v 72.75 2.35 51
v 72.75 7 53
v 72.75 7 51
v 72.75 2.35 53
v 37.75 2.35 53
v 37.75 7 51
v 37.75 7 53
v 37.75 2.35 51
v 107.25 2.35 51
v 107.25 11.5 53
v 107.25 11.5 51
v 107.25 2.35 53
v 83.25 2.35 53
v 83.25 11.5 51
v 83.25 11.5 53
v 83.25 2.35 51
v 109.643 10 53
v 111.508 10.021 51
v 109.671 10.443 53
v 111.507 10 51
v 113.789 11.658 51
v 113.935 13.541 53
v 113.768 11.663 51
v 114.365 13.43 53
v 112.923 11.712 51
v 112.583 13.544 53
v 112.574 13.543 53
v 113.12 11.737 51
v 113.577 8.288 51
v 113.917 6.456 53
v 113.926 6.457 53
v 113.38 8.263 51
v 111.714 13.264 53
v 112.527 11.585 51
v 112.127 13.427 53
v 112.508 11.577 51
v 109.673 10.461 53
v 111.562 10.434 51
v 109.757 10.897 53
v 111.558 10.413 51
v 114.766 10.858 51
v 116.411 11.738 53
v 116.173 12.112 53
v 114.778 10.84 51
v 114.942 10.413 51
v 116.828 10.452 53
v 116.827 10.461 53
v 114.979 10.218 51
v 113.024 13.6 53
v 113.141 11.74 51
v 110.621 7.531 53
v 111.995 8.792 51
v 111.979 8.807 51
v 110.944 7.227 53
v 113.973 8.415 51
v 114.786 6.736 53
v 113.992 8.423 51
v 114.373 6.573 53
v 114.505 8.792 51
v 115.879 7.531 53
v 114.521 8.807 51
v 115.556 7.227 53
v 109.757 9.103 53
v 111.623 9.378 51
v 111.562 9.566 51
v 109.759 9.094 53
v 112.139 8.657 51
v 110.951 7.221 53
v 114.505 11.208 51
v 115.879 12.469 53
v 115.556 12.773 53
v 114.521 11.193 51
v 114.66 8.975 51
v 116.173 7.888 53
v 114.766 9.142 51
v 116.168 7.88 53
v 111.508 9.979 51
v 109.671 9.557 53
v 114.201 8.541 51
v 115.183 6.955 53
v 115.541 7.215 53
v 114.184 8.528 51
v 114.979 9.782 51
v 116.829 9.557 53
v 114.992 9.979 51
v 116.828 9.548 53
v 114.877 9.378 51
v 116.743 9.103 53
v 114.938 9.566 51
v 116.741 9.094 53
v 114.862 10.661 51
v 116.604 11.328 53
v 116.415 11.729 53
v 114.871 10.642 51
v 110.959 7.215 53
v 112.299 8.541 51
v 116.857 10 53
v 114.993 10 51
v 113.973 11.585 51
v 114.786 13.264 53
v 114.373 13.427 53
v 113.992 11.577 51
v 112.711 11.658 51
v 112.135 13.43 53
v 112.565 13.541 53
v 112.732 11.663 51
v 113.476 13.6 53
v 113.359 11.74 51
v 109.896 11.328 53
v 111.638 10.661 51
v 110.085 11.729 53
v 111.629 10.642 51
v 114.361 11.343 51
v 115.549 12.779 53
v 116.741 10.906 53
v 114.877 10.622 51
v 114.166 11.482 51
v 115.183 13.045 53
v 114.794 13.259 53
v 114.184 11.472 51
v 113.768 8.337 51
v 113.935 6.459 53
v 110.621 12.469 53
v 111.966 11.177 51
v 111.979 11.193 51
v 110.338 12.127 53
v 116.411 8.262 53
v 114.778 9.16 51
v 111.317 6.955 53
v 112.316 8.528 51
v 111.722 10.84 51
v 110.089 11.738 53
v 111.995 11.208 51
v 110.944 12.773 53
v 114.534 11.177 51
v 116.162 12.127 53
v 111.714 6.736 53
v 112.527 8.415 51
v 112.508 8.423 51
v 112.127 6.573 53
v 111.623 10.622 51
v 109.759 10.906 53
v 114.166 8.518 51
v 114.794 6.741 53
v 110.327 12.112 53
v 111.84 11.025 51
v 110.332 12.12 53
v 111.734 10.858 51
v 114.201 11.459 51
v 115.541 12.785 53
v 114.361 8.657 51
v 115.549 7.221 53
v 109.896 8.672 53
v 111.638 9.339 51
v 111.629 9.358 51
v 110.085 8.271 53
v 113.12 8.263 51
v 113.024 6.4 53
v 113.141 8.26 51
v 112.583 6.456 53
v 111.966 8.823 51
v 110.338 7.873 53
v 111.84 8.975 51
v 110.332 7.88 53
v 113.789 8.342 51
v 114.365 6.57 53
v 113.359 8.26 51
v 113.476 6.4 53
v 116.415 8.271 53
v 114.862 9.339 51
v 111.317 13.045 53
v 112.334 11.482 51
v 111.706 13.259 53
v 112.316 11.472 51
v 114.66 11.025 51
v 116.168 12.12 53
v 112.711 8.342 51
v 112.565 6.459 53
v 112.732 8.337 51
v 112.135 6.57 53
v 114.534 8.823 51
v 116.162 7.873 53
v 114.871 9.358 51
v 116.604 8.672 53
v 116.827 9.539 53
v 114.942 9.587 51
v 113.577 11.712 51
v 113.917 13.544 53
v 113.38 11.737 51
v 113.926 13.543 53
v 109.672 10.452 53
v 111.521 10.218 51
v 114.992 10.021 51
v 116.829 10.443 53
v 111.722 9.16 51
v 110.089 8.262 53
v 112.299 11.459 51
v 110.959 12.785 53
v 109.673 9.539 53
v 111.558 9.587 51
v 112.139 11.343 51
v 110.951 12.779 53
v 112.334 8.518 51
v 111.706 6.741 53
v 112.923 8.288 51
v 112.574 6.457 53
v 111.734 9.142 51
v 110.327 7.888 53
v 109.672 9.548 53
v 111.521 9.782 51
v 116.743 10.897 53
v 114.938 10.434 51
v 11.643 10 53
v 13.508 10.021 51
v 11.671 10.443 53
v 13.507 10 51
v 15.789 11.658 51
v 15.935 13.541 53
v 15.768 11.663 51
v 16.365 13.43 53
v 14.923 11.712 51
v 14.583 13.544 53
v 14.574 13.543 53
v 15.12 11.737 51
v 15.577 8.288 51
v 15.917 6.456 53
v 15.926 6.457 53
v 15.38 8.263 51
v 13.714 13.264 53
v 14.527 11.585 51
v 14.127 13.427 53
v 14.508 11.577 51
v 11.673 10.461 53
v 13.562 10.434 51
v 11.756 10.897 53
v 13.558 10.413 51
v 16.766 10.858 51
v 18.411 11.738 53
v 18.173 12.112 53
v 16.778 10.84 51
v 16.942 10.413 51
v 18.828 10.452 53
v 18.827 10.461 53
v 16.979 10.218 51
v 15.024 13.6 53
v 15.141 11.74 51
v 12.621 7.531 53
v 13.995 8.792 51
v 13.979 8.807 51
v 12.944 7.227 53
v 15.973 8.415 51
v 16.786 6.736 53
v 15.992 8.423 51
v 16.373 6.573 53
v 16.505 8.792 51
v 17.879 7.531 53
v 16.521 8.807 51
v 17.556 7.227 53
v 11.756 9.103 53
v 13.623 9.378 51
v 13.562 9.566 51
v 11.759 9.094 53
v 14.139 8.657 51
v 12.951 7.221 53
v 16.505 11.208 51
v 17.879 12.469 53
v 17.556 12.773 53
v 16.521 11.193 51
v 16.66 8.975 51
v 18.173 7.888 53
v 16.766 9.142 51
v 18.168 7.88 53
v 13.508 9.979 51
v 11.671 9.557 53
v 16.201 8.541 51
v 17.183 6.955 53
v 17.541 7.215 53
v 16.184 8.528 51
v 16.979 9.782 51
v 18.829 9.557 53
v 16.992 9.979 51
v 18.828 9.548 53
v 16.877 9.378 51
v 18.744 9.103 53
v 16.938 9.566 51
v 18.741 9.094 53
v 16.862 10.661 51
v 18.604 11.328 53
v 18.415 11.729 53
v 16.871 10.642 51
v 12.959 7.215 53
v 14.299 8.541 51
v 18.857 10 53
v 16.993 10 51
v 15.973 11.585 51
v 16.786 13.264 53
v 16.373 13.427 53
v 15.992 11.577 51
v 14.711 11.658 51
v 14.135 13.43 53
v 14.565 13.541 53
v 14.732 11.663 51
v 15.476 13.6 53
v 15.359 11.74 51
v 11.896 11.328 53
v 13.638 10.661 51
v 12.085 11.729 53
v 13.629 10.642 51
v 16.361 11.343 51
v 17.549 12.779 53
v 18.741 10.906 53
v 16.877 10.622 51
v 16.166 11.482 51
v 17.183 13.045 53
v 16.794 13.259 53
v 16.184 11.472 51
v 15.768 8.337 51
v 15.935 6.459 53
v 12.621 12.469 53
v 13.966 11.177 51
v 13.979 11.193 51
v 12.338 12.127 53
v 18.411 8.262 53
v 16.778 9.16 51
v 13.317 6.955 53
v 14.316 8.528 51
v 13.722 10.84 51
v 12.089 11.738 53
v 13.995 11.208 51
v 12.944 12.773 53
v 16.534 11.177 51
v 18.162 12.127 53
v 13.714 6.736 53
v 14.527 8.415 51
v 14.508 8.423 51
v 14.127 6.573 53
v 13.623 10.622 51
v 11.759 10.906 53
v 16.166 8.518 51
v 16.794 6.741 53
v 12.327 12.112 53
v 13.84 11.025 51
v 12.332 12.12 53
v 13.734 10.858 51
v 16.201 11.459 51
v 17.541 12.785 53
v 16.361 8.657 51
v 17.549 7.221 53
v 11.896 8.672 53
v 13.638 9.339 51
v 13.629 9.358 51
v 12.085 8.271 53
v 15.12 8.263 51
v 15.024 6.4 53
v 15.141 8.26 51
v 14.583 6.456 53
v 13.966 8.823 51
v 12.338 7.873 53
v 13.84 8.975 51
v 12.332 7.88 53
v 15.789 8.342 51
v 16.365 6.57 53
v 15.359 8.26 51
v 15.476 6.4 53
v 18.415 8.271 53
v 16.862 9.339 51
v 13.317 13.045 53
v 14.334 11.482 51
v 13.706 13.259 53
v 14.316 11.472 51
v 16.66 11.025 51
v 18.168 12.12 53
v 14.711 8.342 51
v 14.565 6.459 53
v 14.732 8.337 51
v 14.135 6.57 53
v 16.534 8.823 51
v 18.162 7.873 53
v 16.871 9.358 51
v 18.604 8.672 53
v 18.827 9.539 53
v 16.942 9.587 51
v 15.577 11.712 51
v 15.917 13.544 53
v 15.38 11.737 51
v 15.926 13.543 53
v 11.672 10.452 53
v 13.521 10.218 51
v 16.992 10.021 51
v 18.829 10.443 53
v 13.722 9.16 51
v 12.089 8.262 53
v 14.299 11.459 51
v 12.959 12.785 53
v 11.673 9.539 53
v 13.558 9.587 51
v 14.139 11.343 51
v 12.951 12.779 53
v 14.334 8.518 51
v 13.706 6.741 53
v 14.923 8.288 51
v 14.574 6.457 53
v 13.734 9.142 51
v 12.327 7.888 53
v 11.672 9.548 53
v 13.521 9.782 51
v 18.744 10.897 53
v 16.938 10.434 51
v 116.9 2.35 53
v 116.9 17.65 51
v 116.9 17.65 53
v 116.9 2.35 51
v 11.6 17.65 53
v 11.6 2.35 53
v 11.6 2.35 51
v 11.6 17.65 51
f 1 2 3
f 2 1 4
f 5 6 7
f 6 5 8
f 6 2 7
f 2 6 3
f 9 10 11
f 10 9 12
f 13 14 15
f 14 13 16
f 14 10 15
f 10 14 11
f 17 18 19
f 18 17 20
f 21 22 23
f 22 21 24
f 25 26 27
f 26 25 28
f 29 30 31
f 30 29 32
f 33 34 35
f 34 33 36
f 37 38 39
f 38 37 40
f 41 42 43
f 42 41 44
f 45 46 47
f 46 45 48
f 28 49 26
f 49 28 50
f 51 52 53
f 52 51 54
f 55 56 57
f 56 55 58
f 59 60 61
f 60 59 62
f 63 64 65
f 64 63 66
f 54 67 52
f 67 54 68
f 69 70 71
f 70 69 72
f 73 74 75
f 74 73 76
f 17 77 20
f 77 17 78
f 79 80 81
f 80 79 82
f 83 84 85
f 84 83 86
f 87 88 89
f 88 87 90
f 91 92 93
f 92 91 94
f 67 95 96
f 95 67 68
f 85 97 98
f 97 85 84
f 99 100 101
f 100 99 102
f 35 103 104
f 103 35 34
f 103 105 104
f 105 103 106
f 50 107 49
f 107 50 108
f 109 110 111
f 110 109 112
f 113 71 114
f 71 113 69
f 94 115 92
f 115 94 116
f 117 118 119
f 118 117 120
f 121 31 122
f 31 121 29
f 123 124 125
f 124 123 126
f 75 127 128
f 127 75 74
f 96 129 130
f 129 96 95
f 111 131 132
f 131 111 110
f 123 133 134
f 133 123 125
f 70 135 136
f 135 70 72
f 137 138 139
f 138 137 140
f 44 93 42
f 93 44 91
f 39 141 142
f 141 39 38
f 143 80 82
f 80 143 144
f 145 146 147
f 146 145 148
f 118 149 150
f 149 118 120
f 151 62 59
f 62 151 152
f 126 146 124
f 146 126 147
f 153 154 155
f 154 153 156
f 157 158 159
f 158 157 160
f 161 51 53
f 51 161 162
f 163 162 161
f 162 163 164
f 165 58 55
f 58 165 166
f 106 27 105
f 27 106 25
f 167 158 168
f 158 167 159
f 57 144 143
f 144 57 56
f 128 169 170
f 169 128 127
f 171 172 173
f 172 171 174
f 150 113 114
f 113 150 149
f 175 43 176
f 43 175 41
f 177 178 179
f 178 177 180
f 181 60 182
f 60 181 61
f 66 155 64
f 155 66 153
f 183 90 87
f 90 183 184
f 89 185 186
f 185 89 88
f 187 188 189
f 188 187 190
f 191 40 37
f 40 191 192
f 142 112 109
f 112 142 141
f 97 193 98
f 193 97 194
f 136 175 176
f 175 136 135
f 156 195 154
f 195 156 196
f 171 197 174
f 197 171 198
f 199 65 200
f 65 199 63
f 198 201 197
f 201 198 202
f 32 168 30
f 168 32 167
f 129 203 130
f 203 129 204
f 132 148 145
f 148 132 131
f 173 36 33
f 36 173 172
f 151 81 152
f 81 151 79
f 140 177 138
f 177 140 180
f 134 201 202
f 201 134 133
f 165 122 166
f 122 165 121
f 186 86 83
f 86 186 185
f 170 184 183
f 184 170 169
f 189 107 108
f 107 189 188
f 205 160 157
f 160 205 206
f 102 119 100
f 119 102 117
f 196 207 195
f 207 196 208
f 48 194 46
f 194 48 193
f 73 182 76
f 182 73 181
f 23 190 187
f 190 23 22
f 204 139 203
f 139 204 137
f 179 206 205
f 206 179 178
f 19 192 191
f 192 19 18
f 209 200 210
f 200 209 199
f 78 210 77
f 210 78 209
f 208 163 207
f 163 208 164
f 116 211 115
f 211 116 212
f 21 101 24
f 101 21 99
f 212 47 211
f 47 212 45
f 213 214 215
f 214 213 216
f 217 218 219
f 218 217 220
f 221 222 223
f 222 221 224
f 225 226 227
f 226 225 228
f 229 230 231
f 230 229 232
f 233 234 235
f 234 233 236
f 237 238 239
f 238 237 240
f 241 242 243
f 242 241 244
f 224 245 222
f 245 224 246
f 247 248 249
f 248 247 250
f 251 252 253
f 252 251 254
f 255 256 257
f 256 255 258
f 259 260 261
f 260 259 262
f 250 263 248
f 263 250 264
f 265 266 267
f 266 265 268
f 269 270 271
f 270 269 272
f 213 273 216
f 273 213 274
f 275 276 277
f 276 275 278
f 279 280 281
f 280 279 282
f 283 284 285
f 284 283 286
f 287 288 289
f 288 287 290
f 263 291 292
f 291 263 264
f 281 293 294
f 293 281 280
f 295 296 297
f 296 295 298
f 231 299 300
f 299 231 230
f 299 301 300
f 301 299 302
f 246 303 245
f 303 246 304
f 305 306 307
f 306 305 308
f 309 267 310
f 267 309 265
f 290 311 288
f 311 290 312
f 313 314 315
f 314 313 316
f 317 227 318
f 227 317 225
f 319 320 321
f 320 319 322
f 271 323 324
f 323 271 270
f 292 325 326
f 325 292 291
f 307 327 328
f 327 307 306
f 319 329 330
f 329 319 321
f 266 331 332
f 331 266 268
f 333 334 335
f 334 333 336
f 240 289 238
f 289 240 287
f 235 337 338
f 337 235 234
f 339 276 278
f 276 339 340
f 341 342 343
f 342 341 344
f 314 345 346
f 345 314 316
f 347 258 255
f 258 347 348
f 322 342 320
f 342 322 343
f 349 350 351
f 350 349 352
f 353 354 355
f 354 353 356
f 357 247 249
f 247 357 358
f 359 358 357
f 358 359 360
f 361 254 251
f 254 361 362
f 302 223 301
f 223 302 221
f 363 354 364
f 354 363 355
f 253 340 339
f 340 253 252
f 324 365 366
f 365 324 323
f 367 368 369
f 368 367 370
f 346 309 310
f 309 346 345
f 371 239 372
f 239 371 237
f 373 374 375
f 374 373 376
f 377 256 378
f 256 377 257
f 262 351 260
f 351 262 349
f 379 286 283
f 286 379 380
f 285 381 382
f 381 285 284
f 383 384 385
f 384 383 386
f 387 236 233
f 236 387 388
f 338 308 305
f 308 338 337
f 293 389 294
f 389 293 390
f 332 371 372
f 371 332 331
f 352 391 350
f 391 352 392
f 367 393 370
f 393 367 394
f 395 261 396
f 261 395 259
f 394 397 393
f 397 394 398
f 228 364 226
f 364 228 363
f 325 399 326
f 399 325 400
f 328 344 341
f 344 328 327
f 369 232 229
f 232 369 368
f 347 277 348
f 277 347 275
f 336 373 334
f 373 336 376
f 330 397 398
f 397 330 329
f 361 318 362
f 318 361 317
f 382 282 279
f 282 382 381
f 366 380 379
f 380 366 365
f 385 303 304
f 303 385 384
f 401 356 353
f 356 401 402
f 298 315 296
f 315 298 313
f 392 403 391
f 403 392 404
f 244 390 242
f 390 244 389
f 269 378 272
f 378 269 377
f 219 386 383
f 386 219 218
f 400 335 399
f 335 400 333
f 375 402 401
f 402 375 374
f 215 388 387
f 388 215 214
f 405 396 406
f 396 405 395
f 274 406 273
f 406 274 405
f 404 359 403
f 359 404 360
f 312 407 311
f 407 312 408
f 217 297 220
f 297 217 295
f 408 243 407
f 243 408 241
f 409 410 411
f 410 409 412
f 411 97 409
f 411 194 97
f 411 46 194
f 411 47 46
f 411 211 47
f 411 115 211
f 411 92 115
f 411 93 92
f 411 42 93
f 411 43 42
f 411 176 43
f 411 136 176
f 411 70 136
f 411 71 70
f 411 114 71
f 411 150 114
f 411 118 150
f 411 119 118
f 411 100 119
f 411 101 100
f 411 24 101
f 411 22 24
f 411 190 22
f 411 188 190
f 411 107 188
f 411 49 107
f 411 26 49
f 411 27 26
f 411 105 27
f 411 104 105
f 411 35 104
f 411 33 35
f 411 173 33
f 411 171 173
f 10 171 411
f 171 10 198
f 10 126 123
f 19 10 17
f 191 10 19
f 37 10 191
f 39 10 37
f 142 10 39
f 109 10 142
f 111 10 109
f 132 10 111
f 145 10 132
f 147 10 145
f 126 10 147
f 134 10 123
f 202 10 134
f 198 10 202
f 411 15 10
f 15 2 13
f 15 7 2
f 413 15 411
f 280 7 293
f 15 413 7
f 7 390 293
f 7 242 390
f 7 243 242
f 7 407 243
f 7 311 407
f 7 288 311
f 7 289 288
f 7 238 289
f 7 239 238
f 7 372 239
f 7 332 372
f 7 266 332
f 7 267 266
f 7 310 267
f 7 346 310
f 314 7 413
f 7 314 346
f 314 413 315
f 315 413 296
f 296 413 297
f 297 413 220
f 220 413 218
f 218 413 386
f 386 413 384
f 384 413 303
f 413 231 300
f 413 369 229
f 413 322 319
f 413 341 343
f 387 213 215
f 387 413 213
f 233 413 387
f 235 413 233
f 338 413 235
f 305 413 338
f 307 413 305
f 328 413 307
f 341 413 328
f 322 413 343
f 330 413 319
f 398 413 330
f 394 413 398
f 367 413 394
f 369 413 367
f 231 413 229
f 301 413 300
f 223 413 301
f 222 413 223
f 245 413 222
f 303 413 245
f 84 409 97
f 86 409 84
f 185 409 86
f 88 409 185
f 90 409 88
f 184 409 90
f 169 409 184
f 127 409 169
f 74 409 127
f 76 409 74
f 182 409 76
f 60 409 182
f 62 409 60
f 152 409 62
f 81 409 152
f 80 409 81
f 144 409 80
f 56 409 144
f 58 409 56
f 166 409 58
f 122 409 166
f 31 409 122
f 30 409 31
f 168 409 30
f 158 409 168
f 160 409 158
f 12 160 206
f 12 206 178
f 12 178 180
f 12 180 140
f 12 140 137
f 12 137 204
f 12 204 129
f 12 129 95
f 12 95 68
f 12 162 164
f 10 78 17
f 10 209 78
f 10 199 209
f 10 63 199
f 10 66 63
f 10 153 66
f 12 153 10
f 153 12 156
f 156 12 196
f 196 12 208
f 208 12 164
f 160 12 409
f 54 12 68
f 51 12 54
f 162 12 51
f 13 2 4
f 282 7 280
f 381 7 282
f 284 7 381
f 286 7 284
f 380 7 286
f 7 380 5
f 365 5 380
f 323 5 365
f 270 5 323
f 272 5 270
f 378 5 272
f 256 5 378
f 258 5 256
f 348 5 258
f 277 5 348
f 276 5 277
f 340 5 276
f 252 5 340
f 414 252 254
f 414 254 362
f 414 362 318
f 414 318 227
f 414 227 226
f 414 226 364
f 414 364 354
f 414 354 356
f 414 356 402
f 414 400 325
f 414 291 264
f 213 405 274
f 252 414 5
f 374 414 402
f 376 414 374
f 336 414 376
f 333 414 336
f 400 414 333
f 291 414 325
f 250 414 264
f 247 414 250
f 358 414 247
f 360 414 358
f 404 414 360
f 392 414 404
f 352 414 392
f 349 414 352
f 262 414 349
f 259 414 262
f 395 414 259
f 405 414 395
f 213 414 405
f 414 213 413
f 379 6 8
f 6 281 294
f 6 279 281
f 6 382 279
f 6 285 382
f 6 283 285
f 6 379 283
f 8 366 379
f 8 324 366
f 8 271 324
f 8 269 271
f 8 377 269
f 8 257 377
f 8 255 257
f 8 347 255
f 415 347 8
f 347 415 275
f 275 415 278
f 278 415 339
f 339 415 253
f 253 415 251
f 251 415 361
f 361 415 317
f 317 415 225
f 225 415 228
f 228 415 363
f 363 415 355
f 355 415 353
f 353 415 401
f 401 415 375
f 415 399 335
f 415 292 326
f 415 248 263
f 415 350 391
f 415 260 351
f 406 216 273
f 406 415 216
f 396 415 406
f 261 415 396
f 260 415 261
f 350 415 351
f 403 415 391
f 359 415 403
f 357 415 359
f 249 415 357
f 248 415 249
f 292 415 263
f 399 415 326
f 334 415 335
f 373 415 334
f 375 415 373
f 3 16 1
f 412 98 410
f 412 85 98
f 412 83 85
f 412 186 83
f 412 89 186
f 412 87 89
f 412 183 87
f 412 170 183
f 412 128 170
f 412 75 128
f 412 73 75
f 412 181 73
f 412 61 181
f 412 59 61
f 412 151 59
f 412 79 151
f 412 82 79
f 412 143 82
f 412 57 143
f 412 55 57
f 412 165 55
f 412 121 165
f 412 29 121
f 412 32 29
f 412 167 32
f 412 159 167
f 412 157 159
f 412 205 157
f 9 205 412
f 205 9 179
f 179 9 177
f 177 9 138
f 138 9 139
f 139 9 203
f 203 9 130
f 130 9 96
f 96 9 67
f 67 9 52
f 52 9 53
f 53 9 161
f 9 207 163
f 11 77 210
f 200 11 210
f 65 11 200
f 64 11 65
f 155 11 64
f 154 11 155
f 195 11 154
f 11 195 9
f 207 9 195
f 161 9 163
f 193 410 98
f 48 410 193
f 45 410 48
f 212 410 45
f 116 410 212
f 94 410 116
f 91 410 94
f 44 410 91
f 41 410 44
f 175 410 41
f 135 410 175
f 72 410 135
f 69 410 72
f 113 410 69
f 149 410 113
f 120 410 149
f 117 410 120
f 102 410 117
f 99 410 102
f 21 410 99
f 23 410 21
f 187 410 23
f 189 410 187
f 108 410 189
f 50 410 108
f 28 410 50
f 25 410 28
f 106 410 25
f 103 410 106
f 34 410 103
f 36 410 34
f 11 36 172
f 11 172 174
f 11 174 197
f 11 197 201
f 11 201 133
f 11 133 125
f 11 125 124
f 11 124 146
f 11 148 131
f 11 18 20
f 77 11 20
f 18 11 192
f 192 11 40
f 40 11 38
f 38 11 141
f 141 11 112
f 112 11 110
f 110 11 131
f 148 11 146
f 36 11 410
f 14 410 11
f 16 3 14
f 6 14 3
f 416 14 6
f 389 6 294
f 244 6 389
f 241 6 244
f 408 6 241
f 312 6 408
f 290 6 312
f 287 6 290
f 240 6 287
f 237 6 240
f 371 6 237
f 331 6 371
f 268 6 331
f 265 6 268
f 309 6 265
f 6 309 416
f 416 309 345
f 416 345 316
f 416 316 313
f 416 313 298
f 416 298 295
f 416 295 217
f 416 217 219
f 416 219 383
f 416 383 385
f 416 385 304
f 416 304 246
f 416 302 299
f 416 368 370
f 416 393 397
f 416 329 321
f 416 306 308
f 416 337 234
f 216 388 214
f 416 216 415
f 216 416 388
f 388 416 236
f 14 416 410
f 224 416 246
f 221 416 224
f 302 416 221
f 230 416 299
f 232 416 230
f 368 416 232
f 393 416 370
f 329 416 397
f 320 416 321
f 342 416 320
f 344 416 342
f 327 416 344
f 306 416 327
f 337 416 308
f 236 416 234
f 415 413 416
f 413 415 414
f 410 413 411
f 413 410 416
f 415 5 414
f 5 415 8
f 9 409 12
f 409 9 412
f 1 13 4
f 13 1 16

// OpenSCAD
/* PDU Eurorack Enclosure Generator 
 * Modified for purpose by @realtimekodi
 * https://github.com/Real-Time-Kodi/EuroServerRack/
 * Initially designed by KronBjorn
 * https://github.com/KronBjorn/SixInchRack
 * 
 * Creative Commons 4.0 Share Alike With Attribution -- Non-Comercial
 * http://creativecommons.org/licenses/by-nc-sa/4.0/
*/
include<../sixinch_library.scad>

print_frontplate_sml = false;
print_cabinet_sml    = false;
print_lid            = false;
print_rear           = true;

LED_Offset           = 7;
Vent_Length          = 22;
Vent_Frequency       = 6;
Vent_Thickness       = 3;
standoff_hole_size   = 2.3;//2.3 for m2.5, 2.8 for m3
Depth                = 50; //Depth of the case min is somewhere around 98
hp                   = 4; //How many hp units you want this to be min is prob 5

if(print_frontplate_sml){ // Frontplate //
    w=boffset-gauge_box;
    square_hole        = [[24.5, LED_Offset+8.5, 6, 11],
                          [39.5, LED_Offset+8.5, 6, 11],
                          [54.5, LED_Offset+8.5, 6, 11],
                          [69.5, LED_Offset+8.5, 6, 11],
                          [84.5, LED_Offset+8.5, 6, 11],
                          [99.5, LED_Offset+8.5, 6, 11],
                          ];
    round_hole         = [[27.5, LED_Offset+6.25,0.75],[27.5,LED_Offset+21.25,0.75],
                          [42.5, LED_Offset+6.25,0.75],[42.5,LED_Offset+21.25,0.75],
                          [57.5, LED_Offset+6.25,0.75],[57.5,LED_Offset+21.25,0.75],
                          [72.5, LED_Offset+6.25,0.75],[72.5,LED_Offset+21.25,0.75],
                          [87.5, LED_Offset+6.25,0.75],[87.5,LED_Offset+21.25,0.75],
                          [102.5, LED_Offset+6.25,0.75],[102.5,LED_Offset+21.25,0.75],
                          [w+20,LED_Offset,5],
                          [w+35,LED_Offset,5],
                          [w+50,LED_Offset,5],
                          [w+65,LED_Offset,5],
                          [w+80,LED_Offset,5],
                          [w+95,LED_Offset,5]];
    round_peg          = [];   
    screw_side_front   = [hp/2];
    screw_top          = [];
    screw_bottom_front = [];
    
    frontplate(hp,square_hole,round_hole,round_peg,screw_side_front,screw_top,screw_bottom_front);
}

if(print_cabinet_sml){ // Cabinet //  
    w=pi_offset_x;
    h=pi_offset_y;
    screw_bottom_front = [];
    screw_side_front   = [hp/2];
    round_peg          = [[84,Depth-19,6,standoff_hole_size,6],
                          [64,Depth-10,6,standoff_hole_size,6],
                          [24,Depth-10,6,standoff_hole_size,6]
                          ];
    cabinet(Depth,hp,screw_bottom_front,round_peg,screw_side_front);
}

if(print_lid){ // Lid // 
    screw_front = [];//mm
    screw_back  = [];//mm
    lid(Depth,hp,screw_front,screw_back);        
}

if(print_rear){  // Back plate //    
    square_hole  = [
        [26.5,0,35,5],//wire hole
        [72,0,24,9.5],//molex
    ];
    round_hole   = [];
    screw_top    = [];//mm
    screw_bottom = [];//mm
    screw_side   = [hp/2];
    back_plate(hp,Depth,screw_top,screw_bottom,screw_side,square_hole,round_hole);
}  
